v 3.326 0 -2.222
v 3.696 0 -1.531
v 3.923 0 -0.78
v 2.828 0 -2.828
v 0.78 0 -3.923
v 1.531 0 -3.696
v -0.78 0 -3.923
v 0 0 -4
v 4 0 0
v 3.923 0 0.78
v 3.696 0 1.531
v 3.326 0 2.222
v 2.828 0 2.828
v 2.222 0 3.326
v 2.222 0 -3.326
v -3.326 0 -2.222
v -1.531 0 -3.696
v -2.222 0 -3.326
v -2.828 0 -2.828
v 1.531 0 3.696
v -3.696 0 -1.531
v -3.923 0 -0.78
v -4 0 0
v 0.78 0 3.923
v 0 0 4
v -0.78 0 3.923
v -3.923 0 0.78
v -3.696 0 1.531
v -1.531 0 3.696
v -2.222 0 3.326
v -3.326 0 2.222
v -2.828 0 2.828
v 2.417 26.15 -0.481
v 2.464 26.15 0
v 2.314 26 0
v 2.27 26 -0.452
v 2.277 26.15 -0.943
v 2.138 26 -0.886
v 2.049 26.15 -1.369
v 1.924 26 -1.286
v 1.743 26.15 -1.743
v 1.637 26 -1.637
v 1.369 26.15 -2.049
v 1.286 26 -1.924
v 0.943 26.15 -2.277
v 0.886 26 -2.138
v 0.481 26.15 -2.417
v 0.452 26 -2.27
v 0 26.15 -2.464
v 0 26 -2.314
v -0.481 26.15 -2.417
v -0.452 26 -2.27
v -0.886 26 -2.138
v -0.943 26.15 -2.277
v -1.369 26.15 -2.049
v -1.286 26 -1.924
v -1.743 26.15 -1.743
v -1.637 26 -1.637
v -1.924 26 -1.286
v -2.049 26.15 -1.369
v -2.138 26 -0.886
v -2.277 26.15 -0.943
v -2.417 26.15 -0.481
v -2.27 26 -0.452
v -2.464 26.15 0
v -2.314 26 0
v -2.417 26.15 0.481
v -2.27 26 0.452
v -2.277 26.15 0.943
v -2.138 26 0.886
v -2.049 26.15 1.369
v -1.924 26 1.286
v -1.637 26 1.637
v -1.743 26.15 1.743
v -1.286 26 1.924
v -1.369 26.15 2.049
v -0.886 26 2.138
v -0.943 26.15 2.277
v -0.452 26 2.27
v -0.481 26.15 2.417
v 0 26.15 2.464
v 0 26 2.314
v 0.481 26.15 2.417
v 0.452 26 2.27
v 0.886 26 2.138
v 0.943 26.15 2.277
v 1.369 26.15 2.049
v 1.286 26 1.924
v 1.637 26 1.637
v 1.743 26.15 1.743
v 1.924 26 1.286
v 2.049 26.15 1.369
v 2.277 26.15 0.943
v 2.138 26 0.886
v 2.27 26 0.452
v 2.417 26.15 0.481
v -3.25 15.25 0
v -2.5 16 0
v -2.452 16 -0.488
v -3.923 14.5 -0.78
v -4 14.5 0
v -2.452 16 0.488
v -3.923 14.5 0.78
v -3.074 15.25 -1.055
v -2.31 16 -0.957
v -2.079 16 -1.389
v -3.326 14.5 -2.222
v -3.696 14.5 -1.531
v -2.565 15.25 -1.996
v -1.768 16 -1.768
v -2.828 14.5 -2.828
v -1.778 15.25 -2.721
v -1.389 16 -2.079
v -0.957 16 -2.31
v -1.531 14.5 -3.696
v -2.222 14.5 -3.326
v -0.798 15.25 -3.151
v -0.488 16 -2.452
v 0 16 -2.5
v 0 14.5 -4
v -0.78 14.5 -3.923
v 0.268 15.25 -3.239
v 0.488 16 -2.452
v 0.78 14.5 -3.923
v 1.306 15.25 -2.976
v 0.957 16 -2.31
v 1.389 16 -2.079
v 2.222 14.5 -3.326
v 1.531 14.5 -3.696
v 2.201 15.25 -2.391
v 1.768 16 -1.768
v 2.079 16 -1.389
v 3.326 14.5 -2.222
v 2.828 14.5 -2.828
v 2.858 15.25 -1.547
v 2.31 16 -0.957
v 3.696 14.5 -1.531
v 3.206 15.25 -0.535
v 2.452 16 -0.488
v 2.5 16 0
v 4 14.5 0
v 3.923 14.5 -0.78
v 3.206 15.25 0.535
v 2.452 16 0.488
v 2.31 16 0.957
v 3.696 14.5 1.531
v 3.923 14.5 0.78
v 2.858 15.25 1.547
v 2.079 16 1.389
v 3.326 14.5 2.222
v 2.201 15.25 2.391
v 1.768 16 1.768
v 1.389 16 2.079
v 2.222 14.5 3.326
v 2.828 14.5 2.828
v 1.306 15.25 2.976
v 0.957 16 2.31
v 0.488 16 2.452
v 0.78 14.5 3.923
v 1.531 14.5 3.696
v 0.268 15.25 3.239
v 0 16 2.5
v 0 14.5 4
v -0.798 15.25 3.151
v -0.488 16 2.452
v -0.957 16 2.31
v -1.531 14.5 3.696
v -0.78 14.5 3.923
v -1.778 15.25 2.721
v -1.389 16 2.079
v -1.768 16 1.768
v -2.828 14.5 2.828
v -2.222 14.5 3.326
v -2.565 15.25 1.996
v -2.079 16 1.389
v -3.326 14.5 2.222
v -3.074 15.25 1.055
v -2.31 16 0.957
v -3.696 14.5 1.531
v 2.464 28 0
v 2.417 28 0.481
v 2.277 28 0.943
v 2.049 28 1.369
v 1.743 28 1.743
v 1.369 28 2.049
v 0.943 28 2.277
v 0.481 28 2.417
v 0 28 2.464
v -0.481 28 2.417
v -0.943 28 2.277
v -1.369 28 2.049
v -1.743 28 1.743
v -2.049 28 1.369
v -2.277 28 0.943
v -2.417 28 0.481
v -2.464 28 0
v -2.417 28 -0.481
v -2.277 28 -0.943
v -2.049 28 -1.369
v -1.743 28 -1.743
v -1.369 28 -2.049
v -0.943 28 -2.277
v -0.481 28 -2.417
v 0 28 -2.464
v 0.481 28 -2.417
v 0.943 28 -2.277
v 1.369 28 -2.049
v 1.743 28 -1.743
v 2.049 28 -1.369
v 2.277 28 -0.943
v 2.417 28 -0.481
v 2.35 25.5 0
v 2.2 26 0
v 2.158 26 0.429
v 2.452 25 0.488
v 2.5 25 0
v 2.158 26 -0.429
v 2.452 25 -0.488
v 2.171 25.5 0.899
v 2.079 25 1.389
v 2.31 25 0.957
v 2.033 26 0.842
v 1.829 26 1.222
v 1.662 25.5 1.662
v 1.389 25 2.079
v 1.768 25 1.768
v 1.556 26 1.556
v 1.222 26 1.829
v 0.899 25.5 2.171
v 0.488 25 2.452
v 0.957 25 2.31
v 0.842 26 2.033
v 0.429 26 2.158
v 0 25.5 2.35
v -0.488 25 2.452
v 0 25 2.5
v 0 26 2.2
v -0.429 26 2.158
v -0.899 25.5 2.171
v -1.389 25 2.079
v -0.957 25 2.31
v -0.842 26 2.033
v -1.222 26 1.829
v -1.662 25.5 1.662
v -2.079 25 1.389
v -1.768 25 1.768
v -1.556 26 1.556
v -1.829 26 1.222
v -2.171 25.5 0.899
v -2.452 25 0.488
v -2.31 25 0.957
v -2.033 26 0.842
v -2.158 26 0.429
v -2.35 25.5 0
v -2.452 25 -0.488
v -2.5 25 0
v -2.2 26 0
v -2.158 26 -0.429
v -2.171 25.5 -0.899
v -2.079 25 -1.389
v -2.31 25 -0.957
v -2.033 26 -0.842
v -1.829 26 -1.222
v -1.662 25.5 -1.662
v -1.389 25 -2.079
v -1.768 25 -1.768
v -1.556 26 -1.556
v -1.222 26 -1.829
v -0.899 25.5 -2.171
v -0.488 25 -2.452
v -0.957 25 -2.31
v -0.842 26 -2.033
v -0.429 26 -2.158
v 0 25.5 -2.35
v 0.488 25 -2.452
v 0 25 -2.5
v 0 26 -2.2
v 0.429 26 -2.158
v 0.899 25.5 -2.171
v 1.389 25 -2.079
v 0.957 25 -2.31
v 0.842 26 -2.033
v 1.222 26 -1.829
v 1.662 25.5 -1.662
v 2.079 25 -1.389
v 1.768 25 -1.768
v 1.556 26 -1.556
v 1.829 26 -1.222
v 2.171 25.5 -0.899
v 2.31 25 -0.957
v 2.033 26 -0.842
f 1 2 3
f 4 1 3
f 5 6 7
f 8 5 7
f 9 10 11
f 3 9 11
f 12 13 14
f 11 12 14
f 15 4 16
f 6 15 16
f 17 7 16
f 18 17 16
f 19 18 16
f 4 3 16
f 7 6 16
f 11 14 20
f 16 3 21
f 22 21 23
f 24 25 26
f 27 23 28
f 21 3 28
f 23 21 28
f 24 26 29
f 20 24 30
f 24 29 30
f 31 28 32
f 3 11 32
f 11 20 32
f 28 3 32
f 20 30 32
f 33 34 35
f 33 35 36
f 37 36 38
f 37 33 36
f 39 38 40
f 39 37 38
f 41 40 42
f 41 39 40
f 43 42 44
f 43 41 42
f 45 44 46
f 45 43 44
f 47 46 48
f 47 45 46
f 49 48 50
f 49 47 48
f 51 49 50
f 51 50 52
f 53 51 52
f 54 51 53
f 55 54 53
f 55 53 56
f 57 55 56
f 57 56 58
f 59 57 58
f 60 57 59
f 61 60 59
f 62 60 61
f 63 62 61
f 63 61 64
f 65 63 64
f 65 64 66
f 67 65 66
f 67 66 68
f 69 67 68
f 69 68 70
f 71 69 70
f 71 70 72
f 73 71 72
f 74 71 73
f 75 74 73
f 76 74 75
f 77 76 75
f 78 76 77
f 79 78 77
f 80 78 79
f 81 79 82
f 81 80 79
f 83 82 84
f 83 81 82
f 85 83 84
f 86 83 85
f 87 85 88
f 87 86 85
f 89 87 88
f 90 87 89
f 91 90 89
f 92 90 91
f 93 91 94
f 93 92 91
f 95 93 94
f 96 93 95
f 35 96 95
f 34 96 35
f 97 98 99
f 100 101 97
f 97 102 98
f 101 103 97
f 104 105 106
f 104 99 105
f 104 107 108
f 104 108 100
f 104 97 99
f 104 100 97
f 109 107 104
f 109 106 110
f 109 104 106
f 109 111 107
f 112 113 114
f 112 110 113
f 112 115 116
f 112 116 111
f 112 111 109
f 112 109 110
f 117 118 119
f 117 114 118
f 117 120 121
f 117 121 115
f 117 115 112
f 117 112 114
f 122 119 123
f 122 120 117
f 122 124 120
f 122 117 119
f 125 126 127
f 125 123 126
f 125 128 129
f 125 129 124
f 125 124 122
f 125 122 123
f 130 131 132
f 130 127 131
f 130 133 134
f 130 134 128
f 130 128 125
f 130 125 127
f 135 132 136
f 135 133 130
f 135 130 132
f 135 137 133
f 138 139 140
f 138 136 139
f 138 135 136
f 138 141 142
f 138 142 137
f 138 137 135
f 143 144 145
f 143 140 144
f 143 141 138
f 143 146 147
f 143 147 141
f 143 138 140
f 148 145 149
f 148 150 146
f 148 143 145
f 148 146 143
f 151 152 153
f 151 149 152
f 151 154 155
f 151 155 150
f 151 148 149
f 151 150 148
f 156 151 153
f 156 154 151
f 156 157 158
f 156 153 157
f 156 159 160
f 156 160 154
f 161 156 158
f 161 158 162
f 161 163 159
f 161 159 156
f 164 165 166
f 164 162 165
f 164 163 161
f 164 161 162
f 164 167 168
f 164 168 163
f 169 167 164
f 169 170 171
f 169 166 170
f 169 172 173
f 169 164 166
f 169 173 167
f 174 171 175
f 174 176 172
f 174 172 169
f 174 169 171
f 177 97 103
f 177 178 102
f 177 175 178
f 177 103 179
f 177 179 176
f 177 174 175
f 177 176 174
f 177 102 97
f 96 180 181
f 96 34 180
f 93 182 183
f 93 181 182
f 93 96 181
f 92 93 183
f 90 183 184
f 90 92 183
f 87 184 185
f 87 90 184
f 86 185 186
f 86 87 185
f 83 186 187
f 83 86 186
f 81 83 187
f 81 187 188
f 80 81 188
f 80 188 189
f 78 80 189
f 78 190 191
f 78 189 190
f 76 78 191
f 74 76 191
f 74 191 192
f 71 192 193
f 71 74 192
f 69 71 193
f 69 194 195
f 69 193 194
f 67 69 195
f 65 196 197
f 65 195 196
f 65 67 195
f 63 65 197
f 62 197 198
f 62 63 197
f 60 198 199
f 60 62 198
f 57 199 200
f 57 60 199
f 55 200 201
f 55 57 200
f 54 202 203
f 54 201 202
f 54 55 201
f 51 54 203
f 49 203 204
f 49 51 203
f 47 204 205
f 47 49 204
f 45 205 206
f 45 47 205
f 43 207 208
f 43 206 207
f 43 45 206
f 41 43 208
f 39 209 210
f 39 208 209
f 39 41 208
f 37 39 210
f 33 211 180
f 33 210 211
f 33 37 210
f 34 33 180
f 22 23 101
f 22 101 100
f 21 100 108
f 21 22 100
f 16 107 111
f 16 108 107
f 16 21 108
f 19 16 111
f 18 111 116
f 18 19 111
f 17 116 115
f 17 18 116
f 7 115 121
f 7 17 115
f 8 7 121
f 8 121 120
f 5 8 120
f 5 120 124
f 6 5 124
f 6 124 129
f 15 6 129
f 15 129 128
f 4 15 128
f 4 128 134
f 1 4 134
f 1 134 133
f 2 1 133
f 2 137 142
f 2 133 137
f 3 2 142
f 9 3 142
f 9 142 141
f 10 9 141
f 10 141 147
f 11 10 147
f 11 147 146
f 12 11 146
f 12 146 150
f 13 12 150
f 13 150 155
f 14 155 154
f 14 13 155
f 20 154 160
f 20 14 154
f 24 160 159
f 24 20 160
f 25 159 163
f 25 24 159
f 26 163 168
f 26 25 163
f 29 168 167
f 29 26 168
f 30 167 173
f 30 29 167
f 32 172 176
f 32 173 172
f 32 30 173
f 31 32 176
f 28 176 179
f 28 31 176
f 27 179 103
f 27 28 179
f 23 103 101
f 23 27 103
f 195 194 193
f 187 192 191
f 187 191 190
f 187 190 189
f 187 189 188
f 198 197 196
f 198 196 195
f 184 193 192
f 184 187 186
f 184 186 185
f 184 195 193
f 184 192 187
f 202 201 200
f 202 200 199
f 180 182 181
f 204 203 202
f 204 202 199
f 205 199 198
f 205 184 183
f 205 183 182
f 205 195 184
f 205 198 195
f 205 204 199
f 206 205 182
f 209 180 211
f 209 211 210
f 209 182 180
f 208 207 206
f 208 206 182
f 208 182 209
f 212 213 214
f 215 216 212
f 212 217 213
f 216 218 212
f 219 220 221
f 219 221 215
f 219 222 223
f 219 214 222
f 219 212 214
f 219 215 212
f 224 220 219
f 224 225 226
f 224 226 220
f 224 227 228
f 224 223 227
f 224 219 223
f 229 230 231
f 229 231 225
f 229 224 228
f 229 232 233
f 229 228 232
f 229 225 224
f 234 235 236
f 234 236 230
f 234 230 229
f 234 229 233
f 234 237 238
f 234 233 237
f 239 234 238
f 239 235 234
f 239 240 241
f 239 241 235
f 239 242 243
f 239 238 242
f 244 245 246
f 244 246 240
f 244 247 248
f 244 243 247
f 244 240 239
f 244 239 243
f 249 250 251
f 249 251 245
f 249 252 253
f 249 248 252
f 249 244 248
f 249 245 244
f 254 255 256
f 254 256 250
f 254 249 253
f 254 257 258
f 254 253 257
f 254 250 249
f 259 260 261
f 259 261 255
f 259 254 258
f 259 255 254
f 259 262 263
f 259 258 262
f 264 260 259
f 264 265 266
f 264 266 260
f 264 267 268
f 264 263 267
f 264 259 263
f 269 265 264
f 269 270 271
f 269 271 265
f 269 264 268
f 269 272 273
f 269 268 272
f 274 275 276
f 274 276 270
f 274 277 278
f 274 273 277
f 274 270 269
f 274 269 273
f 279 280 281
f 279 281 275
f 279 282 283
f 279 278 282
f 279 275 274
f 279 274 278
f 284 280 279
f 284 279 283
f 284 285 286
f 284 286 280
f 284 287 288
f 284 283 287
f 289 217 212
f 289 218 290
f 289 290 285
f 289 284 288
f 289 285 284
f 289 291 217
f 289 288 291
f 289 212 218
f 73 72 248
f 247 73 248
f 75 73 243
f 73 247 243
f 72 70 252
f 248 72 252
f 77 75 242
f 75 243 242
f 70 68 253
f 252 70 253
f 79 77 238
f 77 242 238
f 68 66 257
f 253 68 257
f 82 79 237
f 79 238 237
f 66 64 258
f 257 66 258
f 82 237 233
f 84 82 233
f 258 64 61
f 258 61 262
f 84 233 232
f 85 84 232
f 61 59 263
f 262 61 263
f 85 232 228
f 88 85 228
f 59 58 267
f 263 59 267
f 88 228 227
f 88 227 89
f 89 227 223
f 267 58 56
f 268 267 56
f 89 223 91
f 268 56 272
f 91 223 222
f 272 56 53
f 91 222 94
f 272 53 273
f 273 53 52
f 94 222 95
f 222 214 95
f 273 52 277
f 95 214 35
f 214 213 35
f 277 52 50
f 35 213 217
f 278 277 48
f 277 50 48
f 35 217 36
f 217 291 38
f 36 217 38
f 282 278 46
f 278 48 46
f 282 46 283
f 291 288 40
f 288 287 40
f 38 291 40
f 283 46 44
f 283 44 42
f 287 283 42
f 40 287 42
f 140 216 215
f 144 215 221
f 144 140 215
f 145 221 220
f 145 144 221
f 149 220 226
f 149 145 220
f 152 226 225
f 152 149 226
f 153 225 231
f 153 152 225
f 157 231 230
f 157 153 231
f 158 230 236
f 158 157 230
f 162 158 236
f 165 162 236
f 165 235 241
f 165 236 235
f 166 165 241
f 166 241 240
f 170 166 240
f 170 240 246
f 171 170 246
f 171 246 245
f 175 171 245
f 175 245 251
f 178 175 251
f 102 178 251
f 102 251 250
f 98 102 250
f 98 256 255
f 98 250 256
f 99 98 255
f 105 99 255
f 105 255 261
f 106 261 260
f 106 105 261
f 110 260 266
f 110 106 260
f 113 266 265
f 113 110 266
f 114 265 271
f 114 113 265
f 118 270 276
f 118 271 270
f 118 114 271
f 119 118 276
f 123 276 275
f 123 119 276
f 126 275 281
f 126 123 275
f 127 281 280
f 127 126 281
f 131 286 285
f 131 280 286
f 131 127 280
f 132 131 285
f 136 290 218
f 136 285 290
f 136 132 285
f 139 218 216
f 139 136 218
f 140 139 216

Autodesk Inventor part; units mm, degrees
ref_plane "YZ Plane" through (0, 0, 0) normal (1, 0, 0) x (0, 1, 0)
ref_plane "XZ Plane" through (0, 0, 0) normal (0, 1, 0) x (-1, 0, 0)
ref_plane "XY Plane" through (0, 0, 0) normal (0, 0, 1) x (1, 0, 0)
sketch "Sketch1" plane through (0, 0, 0) normal (0, 1, 0) x (-1, 0, 0)
  circle A0 centre (0, 0) radius 4
  dimension "d0" = 8
extrude "Extrusion1" add sketch "Sketch1" along normal blind 16
chamfer "Chamfer1" distance 1.5 angle 45 1 edges at (4, 16, 0)
sketch "Sketch2" plane through (0, 16, 0) normal (0, 1, 0) x (1, 0, 0)
  circle A0 centre (0, 0) radius 2.5
extrude "Extrusion2" add sketch "Sketch2" along normal blind 10
chamfer "Chamfer2" distance 0.3 distance2 1 1 edges at (-2.5, 26, 0) measured on face at (1.2612, 26, 0.6619)
sketch "Sketch3" plane through (0, 26, 0) normal (0, 1, 0) x (1, 0, 0)
  circle A0 centre (0, 0) radius 2.5 projected
  circle A1 centre (0, 0) radius 2.4644
extrude "Extrusion3" add sketch "Sketch3" along normal blind 2 contours A1
chamfer "Chamfer3" distance 0.15 angle 45 1 edges at (-2.4644, 26, 0)
properties part number "McCrea_wrist_Walle"
